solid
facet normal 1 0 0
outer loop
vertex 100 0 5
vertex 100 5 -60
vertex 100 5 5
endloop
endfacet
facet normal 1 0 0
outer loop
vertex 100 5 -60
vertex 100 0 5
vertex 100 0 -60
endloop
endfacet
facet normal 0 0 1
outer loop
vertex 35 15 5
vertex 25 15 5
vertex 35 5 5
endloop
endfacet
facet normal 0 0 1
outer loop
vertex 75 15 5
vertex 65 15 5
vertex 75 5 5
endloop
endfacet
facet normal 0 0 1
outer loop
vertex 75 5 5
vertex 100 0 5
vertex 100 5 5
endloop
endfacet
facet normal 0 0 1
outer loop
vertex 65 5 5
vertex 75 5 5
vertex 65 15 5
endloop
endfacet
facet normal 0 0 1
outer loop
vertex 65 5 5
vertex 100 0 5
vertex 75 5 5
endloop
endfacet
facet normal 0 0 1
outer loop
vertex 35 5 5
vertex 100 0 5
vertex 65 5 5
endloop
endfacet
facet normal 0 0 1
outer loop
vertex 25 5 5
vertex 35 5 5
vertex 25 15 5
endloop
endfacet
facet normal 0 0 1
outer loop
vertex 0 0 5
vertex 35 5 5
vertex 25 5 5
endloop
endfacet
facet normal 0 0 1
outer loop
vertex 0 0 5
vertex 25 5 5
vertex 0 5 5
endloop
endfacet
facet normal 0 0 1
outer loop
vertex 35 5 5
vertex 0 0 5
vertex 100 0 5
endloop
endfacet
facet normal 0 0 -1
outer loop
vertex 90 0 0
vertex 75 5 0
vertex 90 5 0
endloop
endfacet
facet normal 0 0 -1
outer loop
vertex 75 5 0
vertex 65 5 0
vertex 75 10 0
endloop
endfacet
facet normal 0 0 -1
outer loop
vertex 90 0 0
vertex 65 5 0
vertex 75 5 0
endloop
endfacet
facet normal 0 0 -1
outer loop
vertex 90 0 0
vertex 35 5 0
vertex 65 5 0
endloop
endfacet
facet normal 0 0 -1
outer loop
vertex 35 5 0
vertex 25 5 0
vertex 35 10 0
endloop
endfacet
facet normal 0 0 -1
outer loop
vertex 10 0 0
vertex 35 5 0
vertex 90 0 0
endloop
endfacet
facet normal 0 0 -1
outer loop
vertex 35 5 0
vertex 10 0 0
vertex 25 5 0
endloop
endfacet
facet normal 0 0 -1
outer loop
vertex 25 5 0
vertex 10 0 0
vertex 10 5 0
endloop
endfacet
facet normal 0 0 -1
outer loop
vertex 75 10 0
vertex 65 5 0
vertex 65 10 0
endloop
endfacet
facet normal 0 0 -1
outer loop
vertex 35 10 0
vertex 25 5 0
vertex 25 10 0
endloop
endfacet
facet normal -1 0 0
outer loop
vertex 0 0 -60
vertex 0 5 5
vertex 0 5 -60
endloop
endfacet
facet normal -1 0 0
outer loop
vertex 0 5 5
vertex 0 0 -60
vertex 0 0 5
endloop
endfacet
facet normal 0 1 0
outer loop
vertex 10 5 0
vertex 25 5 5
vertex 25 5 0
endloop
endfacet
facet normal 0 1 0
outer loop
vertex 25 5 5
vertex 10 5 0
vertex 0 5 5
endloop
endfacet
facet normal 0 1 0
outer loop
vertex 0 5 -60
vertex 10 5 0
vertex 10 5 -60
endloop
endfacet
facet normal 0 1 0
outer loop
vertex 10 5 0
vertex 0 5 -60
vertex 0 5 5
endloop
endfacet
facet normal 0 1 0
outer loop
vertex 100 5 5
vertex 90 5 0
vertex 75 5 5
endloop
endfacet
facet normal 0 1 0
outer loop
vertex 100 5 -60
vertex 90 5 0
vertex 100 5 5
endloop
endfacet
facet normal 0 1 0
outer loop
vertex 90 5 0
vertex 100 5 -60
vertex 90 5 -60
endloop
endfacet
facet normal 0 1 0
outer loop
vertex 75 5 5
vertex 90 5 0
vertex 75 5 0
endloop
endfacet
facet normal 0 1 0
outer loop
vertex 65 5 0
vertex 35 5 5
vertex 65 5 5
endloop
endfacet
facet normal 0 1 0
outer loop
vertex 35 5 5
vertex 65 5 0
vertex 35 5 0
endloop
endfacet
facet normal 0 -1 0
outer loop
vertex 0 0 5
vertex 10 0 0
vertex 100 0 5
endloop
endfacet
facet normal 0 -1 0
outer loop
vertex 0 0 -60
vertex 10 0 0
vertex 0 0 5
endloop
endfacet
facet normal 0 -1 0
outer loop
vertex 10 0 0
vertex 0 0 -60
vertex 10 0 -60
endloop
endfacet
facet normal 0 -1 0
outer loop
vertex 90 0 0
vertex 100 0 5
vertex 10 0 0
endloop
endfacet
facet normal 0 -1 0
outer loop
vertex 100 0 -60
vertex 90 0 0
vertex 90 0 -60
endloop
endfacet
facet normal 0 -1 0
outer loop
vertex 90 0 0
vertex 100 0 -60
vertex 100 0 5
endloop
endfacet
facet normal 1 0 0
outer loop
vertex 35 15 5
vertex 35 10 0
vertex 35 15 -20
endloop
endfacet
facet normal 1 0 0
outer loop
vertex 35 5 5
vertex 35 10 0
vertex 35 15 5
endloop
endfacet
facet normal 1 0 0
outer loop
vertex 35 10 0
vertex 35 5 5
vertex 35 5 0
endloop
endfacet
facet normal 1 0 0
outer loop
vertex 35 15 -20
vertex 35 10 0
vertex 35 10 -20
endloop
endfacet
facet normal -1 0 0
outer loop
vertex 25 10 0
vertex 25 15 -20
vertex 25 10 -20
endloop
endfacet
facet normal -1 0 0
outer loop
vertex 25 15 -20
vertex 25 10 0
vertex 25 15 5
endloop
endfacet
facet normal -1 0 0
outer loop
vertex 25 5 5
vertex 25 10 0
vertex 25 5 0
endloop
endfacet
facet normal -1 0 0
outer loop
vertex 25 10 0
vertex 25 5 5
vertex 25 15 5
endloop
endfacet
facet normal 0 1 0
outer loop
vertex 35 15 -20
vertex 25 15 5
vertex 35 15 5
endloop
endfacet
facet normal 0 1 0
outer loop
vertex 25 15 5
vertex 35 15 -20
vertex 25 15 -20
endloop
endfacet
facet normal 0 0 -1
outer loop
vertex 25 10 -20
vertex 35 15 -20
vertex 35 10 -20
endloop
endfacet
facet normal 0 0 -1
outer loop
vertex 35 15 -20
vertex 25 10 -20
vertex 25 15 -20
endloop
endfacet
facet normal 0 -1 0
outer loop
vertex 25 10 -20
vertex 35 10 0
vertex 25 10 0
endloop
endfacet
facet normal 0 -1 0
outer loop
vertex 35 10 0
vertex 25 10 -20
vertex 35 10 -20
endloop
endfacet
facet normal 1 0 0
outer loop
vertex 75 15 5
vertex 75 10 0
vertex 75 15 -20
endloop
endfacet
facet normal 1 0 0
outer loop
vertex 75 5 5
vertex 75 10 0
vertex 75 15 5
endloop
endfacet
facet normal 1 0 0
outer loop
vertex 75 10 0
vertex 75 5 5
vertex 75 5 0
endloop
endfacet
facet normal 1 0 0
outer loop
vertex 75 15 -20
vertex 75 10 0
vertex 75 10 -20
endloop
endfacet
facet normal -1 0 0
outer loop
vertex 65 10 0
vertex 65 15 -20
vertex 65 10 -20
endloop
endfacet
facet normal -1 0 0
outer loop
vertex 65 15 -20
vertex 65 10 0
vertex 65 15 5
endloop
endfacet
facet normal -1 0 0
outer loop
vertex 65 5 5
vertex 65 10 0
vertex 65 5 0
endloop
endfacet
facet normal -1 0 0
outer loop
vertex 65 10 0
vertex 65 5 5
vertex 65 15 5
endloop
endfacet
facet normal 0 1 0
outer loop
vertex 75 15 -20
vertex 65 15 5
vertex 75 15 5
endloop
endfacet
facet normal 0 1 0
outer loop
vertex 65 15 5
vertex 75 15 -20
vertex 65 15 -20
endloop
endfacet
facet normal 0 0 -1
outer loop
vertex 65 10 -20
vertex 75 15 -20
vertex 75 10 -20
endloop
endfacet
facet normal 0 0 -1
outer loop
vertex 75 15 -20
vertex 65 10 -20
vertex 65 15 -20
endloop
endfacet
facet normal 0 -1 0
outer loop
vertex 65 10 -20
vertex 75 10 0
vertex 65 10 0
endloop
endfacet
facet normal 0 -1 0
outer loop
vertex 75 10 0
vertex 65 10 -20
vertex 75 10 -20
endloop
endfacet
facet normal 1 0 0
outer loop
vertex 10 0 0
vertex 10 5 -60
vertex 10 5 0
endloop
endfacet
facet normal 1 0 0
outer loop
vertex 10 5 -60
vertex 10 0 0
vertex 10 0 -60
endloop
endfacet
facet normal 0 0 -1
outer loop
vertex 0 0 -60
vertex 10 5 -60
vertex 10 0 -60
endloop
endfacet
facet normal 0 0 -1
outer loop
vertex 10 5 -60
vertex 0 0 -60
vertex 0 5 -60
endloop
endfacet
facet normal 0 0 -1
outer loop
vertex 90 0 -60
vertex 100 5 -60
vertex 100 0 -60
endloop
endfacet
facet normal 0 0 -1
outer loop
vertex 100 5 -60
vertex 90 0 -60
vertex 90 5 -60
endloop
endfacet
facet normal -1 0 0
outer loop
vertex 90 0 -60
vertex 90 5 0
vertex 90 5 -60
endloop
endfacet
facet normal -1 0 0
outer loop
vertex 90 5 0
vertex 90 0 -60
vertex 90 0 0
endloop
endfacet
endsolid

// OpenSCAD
// Piano Book Holder

// Customizable Parameters
frontRcubeHeight = 10; //[5,10,20,30,40]
frontLcubeHeight = 10; //[5,10,20,30,40]
backRcubeHeight = 10; //[10,20,30,40,50,60]
backLcubeHeight = 10; //[10,20,30,40,50,60]

// Joining part
cube([100,5,5]);

// Front Left Arm
//Cube that connects joining part to arm
translate([25,0,0]) 
    cube([10,15,5]); 
//Cube for the arm
translate([25,10,-20]) 
    cube([10,5,20]);

// Front Right Arm
//Cube that connects joining part to arm
translate([65,0,0]) 
    cube([10,15,5]);
//Cube for the arm
translate([65,10,-20]) 
    cube([10,5,20]);

// Back Left Arm
translate([0,0,-60]) 
    cube([10,5,60]);

// Back Right Arm
translate([90,0,-60]) 
    cube([10,5,60]);
